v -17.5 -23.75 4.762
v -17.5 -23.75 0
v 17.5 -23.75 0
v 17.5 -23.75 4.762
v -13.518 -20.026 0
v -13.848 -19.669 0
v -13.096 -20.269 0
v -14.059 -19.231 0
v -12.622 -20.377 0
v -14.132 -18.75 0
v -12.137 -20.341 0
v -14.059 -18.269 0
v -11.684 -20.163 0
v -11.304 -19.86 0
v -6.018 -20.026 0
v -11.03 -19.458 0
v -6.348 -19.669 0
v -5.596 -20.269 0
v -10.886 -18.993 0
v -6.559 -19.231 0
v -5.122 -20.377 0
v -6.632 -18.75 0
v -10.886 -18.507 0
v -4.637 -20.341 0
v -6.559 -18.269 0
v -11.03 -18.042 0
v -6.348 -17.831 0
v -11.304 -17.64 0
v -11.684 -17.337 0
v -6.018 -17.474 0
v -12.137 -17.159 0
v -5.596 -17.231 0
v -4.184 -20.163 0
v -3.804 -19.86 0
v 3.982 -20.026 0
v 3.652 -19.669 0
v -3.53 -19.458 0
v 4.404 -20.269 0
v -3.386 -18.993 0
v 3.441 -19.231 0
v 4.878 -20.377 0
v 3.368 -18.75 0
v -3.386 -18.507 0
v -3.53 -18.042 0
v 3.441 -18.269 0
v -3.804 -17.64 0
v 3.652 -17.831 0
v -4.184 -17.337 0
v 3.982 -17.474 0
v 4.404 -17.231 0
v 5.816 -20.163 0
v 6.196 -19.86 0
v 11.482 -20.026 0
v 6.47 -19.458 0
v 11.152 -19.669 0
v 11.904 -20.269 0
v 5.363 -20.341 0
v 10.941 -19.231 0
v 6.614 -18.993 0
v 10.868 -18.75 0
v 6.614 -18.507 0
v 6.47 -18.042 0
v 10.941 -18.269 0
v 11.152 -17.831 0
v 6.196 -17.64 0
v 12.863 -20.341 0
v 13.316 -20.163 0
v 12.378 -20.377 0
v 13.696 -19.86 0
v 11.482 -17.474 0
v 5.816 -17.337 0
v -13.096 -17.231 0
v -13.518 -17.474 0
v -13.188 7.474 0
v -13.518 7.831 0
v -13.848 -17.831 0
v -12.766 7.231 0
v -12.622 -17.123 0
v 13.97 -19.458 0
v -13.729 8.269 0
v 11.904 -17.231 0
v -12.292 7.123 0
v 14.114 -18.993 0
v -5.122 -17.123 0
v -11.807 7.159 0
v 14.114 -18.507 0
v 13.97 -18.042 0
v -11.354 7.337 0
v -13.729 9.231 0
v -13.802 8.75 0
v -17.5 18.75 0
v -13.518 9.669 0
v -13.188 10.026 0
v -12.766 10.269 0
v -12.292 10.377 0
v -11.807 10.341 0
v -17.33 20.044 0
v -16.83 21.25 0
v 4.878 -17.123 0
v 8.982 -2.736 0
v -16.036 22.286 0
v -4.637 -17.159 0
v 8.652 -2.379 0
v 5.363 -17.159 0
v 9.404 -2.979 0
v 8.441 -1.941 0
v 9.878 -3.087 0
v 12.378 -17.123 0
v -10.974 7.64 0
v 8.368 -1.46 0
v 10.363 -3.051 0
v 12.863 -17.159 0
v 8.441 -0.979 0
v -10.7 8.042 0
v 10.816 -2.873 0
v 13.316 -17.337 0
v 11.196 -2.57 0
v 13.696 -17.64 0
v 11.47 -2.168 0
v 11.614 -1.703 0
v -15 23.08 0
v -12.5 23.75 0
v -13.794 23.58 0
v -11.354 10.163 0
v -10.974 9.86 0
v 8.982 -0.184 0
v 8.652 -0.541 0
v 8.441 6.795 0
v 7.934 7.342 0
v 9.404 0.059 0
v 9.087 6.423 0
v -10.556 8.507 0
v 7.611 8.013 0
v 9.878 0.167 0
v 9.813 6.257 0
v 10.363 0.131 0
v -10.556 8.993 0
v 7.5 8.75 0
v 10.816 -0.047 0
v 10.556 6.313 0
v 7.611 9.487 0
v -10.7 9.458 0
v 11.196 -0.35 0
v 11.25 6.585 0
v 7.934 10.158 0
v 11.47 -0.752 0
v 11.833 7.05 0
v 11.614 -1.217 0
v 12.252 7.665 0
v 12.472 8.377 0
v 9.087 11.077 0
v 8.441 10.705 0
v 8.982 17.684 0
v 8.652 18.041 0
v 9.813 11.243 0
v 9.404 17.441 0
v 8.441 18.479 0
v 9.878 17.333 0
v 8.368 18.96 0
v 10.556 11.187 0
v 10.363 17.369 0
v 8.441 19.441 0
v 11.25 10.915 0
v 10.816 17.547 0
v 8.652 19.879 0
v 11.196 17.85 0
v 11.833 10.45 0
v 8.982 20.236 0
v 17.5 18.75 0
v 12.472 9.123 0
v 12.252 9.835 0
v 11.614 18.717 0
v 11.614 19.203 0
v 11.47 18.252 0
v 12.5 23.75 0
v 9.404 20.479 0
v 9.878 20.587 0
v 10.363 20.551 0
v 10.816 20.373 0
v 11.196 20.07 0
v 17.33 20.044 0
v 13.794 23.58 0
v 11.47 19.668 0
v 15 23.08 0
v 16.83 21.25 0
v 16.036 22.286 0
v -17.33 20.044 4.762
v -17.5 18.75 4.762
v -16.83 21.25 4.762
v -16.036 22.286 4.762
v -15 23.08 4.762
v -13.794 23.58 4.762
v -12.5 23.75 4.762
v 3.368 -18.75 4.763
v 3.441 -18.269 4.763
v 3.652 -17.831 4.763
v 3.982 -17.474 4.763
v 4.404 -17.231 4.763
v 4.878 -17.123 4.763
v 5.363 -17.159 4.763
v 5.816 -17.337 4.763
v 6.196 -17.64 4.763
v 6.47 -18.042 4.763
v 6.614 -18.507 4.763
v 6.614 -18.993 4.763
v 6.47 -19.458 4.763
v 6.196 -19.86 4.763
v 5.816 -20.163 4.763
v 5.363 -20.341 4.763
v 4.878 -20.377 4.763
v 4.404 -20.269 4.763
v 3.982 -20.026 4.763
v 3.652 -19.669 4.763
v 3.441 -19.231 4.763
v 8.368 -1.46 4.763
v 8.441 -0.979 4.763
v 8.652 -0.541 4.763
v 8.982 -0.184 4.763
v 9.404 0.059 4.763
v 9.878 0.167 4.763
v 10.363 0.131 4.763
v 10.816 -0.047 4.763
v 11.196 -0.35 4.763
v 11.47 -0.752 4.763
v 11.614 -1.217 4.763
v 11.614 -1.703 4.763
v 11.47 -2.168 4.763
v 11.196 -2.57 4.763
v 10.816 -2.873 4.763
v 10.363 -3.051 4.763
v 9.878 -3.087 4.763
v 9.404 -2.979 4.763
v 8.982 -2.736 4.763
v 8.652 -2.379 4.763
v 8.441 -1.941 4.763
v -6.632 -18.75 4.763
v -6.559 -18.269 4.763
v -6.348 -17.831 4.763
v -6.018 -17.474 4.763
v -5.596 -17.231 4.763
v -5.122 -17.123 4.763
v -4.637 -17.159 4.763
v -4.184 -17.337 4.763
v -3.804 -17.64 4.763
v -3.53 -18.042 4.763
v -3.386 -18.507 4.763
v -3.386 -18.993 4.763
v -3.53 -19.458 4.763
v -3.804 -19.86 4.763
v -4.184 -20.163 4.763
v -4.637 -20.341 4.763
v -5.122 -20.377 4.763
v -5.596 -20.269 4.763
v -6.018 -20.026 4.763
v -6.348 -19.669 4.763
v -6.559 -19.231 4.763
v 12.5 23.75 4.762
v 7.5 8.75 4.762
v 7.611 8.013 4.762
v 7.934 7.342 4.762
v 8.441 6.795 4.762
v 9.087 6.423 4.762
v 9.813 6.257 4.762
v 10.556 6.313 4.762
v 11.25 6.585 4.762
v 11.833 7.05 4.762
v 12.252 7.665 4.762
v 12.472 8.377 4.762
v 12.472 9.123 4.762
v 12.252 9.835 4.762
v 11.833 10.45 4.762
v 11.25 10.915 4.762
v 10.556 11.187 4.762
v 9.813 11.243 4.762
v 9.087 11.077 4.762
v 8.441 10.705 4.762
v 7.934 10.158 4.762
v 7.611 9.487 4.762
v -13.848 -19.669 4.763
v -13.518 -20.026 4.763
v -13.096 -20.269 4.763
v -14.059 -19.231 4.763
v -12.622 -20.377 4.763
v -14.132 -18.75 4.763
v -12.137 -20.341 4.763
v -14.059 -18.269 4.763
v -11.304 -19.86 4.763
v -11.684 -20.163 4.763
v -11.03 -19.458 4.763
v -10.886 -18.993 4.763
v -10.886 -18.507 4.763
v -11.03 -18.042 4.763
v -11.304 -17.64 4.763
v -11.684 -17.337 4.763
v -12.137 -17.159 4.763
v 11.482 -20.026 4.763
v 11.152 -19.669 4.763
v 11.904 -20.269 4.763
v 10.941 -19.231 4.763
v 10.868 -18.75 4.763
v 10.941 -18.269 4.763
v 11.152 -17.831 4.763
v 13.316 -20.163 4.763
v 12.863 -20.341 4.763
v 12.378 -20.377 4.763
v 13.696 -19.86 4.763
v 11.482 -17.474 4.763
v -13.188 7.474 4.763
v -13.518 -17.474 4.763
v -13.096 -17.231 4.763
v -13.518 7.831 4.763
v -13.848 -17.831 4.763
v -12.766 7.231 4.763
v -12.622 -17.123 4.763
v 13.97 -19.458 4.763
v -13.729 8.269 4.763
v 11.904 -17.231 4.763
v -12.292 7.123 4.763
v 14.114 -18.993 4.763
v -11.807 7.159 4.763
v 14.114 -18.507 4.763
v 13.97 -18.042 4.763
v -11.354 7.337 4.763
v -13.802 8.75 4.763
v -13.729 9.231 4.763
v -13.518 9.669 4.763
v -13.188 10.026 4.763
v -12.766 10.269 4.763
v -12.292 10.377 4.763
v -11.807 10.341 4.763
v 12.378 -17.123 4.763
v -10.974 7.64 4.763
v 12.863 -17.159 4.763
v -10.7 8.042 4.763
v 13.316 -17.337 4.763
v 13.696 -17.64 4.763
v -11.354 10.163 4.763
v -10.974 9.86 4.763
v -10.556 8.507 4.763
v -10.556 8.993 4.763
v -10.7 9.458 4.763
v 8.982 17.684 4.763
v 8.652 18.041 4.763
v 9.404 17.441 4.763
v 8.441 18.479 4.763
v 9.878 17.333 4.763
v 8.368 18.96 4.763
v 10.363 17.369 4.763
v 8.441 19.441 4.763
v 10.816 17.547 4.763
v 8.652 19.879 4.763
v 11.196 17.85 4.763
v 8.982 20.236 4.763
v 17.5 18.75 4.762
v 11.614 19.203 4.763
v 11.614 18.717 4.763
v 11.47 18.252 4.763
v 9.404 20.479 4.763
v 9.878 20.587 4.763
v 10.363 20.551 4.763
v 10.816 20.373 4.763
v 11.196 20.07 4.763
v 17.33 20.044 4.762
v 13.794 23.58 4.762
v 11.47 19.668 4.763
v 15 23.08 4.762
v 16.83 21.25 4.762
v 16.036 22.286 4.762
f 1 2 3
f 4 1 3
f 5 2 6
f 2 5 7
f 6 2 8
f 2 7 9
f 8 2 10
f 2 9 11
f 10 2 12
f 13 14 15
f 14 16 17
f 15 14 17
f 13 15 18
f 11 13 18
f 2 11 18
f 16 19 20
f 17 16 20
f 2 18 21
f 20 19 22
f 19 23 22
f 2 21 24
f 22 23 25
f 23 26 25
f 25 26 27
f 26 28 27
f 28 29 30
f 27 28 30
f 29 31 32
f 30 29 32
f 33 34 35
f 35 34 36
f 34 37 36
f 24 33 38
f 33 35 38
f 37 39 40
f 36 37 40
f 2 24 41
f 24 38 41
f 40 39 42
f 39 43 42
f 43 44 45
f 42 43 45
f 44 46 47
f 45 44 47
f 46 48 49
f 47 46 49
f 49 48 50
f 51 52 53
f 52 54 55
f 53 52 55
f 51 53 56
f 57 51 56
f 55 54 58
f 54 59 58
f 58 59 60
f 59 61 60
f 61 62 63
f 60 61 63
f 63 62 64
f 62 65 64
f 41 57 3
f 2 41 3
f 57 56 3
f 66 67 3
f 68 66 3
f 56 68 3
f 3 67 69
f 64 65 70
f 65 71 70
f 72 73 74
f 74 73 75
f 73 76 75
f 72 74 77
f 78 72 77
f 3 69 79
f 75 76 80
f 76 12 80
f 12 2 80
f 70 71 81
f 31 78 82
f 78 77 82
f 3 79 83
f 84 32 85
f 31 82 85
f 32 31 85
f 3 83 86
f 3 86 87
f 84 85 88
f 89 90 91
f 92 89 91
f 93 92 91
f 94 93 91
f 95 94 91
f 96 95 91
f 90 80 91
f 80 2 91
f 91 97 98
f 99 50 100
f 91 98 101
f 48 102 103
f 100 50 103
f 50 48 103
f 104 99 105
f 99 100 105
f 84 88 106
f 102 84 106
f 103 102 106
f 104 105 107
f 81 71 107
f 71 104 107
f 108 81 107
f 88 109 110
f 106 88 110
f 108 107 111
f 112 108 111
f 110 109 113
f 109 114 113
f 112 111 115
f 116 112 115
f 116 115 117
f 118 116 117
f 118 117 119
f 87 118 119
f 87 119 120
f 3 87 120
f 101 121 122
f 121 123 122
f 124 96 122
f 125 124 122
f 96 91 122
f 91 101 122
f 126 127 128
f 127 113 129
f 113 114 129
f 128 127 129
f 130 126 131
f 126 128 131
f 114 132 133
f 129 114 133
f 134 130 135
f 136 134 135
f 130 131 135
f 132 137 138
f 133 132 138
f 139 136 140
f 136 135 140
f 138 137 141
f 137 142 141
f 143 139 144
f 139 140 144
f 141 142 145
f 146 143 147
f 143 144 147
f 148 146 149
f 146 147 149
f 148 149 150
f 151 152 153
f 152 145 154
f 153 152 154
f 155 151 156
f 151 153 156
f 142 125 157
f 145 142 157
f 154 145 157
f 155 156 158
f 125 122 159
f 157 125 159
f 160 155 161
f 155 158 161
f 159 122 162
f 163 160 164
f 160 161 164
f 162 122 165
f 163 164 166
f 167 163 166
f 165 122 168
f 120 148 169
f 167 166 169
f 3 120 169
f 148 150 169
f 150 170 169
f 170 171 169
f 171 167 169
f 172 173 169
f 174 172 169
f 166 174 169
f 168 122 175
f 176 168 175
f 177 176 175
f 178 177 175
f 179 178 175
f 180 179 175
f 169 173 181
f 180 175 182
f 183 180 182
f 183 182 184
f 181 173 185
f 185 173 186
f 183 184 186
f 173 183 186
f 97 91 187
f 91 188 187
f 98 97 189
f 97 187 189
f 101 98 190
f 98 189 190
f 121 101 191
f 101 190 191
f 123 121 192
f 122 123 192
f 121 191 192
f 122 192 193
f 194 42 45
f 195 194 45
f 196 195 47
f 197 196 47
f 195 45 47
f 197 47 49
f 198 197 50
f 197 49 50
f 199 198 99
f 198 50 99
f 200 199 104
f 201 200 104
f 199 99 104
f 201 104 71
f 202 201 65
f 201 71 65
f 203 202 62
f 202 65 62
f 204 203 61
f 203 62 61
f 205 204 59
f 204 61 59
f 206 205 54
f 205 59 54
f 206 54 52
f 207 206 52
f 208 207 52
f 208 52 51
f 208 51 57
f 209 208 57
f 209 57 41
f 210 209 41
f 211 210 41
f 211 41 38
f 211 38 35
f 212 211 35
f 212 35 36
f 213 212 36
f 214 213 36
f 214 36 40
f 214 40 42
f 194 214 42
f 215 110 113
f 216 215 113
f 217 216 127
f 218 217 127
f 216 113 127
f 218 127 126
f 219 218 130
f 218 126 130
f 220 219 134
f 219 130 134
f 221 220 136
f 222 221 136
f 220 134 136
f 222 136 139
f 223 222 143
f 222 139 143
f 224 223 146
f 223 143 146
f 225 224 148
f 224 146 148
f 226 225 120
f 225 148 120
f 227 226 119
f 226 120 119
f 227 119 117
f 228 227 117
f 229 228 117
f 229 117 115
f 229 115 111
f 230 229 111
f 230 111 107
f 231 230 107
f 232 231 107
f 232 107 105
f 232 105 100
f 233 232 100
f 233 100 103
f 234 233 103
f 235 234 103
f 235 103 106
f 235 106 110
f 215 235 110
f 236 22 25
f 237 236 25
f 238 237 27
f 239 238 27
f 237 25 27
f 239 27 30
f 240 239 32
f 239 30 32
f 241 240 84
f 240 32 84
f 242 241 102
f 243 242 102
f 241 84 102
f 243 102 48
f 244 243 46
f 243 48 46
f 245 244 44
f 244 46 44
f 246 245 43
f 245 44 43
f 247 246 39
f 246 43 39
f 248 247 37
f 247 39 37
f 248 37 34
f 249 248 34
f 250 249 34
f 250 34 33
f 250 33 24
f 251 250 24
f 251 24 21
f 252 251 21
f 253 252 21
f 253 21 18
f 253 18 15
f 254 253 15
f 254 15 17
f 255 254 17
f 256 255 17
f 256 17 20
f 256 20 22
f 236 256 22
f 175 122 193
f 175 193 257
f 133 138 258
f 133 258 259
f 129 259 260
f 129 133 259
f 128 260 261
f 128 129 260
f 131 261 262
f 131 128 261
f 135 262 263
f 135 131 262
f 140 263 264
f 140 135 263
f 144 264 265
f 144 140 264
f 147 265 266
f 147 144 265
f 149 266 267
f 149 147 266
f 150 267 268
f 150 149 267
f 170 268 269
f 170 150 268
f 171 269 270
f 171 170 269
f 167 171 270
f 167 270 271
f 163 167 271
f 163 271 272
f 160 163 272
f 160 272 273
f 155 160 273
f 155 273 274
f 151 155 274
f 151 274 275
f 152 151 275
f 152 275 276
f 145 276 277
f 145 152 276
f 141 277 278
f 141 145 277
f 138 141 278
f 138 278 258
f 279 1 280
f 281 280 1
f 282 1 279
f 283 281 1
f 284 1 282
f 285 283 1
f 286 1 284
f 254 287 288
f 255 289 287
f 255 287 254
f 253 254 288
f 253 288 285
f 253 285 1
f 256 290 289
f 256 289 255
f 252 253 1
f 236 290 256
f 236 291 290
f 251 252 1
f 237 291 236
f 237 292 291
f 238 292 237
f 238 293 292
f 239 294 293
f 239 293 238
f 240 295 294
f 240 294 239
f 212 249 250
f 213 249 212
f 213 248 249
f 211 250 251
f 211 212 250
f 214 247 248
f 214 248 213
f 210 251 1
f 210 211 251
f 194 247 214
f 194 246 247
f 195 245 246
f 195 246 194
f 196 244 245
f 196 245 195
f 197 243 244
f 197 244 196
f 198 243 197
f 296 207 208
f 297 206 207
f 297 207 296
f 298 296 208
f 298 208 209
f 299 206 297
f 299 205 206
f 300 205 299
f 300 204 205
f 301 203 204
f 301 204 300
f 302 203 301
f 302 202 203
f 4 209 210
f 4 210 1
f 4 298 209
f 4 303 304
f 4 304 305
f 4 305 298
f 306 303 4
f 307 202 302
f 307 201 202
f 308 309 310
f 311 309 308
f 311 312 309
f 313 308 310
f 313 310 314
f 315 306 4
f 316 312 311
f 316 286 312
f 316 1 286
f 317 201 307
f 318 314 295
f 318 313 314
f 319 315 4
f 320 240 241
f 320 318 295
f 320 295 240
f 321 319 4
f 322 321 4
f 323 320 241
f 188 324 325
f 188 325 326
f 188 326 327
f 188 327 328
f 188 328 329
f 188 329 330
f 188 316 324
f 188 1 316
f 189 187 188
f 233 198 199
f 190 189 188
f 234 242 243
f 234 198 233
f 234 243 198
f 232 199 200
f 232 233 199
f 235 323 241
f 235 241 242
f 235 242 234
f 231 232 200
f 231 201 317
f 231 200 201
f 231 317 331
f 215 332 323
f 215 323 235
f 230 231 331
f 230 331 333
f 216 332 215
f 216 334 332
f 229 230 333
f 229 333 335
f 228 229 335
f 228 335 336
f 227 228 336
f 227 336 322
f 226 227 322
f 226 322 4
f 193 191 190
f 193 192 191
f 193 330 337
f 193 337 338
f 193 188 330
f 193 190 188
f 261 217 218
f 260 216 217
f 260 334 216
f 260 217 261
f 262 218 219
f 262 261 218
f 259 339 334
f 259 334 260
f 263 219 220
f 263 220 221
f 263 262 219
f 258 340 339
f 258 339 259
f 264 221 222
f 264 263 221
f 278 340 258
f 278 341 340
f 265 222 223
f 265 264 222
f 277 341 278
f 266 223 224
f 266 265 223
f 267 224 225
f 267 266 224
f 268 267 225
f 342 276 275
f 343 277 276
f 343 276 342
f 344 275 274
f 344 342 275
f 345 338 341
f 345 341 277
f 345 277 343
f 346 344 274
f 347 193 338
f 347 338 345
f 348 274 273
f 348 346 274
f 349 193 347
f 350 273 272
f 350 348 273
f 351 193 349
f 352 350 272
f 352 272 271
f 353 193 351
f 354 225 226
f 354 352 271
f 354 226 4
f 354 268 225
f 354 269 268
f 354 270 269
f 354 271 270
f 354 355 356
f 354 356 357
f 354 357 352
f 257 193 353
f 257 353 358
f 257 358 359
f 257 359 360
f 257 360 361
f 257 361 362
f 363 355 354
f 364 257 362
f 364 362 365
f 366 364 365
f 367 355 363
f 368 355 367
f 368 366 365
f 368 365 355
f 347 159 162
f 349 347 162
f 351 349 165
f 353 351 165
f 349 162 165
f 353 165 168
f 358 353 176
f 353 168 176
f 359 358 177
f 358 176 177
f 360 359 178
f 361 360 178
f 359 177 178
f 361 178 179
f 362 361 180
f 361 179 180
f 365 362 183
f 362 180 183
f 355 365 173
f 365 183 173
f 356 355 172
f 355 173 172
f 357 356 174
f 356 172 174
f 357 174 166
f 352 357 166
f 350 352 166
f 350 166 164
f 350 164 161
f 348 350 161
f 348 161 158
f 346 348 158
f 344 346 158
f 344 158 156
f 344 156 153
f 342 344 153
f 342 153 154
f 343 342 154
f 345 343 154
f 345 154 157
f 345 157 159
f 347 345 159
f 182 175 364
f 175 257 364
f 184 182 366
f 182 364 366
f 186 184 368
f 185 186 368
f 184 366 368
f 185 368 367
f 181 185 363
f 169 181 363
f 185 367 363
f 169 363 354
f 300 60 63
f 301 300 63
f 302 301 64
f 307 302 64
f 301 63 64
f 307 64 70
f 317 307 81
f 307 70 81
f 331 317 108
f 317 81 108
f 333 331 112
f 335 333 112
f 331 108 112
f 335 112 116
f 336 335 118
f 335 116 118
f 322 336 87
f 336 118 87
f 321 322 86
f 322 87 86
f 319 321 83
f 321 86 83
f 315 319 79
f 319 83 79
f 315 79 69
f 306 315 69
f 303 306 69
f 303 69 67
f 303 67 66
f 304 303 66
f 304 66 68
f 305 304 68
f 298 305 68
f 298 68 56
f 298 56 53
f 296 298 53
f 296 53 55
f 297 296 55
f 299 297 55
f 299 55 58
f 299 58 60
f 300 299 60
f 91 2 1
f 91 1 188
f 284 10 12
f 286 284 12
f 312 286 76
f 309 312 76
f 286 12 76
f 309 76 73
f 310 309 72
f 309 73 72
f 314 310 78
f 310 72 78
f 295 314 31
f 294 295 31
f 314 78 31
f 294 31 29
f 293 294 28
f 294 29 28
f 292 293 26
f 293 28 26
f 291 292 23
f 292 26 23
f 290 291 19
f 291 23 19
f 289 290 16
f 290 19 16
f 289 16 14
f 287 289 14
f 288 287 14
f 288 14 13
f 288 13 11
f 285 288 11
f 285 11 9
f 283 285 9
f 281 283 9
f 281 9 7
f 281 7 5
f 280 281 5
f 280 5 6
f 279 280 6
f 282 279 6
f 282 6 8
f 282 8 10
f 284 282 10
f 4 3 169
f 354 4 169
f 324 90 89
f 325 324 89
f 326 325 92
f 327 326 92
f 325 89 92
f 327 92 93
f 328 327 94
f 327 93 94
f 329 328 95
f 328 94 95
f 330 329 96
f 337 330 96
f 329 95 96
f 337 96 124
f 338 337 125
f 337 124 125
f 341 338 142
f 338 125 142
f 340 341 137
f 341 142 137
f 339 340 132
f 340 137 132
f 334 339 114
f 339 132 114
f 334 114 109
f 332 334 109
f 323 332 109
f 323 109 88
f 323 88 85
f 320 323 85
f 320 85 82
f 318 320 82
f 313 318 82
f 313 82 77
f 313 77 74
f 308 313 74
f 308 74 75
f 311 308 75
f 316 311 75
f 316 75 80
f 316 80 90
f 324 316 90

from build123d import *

# Parameters (mm, degrees)
SKETCH1_W             = 35
SKETCH1_H             = 47.5
SKETCH1_R             = 2.5
BOSS_EXTRUDE1_DEPTH   = 4.7625
F_4_CLEARANCE_HOLE1_D = 3.2639
FILLET1_R             = 5
F_4_CLEARANCE_HOLE2_D = 3.2639


with BuildPart() as part:
    # Sketch1 → Boss-Extrude1 (new body)
    with BuildSketch(Plane.XY):
        Rectangle(SKETCH1_W, SKETCH1_H)
        with Locations(Location((10, 8.75, 0), (0, 0, 180))):
            Circle(SKETCH1_R, mode=Mode.SUBTRACT)
    extrude(amount=BOSS_EXTRUDE1_DEPTH)

    # #4 Clearance Hole1 (through all)
    with Locations(Plane.XY.offset(4.7625)):
        with Locations((10, 18.96), (10, -1.46), (-12.17, 8.75)):
            Hole(F_4_CLEARANCE_HOLE1_D / 2)

    # Fillet1
    fillet1_edges = [part.edges().sort_by_distance(p)[0] for p in [
        (-17.5, 23.75, 2.38125),
        (17.5, 23.75, 2.38125),
    ]]
    fillet(fillet1_edges, radius=FILLET1_R)

    # #4 Clearance Hole2 (through all)
    with Locations(Plane.XY.offset(4.7625)):
        with Locations((-12.5, -18.75), (12.5, -18.75), (-5, -18.75), (5, -18.75)):
            Hole(F_4_CLEARANCE_HOLE2_D / 2)


solid = part.part
